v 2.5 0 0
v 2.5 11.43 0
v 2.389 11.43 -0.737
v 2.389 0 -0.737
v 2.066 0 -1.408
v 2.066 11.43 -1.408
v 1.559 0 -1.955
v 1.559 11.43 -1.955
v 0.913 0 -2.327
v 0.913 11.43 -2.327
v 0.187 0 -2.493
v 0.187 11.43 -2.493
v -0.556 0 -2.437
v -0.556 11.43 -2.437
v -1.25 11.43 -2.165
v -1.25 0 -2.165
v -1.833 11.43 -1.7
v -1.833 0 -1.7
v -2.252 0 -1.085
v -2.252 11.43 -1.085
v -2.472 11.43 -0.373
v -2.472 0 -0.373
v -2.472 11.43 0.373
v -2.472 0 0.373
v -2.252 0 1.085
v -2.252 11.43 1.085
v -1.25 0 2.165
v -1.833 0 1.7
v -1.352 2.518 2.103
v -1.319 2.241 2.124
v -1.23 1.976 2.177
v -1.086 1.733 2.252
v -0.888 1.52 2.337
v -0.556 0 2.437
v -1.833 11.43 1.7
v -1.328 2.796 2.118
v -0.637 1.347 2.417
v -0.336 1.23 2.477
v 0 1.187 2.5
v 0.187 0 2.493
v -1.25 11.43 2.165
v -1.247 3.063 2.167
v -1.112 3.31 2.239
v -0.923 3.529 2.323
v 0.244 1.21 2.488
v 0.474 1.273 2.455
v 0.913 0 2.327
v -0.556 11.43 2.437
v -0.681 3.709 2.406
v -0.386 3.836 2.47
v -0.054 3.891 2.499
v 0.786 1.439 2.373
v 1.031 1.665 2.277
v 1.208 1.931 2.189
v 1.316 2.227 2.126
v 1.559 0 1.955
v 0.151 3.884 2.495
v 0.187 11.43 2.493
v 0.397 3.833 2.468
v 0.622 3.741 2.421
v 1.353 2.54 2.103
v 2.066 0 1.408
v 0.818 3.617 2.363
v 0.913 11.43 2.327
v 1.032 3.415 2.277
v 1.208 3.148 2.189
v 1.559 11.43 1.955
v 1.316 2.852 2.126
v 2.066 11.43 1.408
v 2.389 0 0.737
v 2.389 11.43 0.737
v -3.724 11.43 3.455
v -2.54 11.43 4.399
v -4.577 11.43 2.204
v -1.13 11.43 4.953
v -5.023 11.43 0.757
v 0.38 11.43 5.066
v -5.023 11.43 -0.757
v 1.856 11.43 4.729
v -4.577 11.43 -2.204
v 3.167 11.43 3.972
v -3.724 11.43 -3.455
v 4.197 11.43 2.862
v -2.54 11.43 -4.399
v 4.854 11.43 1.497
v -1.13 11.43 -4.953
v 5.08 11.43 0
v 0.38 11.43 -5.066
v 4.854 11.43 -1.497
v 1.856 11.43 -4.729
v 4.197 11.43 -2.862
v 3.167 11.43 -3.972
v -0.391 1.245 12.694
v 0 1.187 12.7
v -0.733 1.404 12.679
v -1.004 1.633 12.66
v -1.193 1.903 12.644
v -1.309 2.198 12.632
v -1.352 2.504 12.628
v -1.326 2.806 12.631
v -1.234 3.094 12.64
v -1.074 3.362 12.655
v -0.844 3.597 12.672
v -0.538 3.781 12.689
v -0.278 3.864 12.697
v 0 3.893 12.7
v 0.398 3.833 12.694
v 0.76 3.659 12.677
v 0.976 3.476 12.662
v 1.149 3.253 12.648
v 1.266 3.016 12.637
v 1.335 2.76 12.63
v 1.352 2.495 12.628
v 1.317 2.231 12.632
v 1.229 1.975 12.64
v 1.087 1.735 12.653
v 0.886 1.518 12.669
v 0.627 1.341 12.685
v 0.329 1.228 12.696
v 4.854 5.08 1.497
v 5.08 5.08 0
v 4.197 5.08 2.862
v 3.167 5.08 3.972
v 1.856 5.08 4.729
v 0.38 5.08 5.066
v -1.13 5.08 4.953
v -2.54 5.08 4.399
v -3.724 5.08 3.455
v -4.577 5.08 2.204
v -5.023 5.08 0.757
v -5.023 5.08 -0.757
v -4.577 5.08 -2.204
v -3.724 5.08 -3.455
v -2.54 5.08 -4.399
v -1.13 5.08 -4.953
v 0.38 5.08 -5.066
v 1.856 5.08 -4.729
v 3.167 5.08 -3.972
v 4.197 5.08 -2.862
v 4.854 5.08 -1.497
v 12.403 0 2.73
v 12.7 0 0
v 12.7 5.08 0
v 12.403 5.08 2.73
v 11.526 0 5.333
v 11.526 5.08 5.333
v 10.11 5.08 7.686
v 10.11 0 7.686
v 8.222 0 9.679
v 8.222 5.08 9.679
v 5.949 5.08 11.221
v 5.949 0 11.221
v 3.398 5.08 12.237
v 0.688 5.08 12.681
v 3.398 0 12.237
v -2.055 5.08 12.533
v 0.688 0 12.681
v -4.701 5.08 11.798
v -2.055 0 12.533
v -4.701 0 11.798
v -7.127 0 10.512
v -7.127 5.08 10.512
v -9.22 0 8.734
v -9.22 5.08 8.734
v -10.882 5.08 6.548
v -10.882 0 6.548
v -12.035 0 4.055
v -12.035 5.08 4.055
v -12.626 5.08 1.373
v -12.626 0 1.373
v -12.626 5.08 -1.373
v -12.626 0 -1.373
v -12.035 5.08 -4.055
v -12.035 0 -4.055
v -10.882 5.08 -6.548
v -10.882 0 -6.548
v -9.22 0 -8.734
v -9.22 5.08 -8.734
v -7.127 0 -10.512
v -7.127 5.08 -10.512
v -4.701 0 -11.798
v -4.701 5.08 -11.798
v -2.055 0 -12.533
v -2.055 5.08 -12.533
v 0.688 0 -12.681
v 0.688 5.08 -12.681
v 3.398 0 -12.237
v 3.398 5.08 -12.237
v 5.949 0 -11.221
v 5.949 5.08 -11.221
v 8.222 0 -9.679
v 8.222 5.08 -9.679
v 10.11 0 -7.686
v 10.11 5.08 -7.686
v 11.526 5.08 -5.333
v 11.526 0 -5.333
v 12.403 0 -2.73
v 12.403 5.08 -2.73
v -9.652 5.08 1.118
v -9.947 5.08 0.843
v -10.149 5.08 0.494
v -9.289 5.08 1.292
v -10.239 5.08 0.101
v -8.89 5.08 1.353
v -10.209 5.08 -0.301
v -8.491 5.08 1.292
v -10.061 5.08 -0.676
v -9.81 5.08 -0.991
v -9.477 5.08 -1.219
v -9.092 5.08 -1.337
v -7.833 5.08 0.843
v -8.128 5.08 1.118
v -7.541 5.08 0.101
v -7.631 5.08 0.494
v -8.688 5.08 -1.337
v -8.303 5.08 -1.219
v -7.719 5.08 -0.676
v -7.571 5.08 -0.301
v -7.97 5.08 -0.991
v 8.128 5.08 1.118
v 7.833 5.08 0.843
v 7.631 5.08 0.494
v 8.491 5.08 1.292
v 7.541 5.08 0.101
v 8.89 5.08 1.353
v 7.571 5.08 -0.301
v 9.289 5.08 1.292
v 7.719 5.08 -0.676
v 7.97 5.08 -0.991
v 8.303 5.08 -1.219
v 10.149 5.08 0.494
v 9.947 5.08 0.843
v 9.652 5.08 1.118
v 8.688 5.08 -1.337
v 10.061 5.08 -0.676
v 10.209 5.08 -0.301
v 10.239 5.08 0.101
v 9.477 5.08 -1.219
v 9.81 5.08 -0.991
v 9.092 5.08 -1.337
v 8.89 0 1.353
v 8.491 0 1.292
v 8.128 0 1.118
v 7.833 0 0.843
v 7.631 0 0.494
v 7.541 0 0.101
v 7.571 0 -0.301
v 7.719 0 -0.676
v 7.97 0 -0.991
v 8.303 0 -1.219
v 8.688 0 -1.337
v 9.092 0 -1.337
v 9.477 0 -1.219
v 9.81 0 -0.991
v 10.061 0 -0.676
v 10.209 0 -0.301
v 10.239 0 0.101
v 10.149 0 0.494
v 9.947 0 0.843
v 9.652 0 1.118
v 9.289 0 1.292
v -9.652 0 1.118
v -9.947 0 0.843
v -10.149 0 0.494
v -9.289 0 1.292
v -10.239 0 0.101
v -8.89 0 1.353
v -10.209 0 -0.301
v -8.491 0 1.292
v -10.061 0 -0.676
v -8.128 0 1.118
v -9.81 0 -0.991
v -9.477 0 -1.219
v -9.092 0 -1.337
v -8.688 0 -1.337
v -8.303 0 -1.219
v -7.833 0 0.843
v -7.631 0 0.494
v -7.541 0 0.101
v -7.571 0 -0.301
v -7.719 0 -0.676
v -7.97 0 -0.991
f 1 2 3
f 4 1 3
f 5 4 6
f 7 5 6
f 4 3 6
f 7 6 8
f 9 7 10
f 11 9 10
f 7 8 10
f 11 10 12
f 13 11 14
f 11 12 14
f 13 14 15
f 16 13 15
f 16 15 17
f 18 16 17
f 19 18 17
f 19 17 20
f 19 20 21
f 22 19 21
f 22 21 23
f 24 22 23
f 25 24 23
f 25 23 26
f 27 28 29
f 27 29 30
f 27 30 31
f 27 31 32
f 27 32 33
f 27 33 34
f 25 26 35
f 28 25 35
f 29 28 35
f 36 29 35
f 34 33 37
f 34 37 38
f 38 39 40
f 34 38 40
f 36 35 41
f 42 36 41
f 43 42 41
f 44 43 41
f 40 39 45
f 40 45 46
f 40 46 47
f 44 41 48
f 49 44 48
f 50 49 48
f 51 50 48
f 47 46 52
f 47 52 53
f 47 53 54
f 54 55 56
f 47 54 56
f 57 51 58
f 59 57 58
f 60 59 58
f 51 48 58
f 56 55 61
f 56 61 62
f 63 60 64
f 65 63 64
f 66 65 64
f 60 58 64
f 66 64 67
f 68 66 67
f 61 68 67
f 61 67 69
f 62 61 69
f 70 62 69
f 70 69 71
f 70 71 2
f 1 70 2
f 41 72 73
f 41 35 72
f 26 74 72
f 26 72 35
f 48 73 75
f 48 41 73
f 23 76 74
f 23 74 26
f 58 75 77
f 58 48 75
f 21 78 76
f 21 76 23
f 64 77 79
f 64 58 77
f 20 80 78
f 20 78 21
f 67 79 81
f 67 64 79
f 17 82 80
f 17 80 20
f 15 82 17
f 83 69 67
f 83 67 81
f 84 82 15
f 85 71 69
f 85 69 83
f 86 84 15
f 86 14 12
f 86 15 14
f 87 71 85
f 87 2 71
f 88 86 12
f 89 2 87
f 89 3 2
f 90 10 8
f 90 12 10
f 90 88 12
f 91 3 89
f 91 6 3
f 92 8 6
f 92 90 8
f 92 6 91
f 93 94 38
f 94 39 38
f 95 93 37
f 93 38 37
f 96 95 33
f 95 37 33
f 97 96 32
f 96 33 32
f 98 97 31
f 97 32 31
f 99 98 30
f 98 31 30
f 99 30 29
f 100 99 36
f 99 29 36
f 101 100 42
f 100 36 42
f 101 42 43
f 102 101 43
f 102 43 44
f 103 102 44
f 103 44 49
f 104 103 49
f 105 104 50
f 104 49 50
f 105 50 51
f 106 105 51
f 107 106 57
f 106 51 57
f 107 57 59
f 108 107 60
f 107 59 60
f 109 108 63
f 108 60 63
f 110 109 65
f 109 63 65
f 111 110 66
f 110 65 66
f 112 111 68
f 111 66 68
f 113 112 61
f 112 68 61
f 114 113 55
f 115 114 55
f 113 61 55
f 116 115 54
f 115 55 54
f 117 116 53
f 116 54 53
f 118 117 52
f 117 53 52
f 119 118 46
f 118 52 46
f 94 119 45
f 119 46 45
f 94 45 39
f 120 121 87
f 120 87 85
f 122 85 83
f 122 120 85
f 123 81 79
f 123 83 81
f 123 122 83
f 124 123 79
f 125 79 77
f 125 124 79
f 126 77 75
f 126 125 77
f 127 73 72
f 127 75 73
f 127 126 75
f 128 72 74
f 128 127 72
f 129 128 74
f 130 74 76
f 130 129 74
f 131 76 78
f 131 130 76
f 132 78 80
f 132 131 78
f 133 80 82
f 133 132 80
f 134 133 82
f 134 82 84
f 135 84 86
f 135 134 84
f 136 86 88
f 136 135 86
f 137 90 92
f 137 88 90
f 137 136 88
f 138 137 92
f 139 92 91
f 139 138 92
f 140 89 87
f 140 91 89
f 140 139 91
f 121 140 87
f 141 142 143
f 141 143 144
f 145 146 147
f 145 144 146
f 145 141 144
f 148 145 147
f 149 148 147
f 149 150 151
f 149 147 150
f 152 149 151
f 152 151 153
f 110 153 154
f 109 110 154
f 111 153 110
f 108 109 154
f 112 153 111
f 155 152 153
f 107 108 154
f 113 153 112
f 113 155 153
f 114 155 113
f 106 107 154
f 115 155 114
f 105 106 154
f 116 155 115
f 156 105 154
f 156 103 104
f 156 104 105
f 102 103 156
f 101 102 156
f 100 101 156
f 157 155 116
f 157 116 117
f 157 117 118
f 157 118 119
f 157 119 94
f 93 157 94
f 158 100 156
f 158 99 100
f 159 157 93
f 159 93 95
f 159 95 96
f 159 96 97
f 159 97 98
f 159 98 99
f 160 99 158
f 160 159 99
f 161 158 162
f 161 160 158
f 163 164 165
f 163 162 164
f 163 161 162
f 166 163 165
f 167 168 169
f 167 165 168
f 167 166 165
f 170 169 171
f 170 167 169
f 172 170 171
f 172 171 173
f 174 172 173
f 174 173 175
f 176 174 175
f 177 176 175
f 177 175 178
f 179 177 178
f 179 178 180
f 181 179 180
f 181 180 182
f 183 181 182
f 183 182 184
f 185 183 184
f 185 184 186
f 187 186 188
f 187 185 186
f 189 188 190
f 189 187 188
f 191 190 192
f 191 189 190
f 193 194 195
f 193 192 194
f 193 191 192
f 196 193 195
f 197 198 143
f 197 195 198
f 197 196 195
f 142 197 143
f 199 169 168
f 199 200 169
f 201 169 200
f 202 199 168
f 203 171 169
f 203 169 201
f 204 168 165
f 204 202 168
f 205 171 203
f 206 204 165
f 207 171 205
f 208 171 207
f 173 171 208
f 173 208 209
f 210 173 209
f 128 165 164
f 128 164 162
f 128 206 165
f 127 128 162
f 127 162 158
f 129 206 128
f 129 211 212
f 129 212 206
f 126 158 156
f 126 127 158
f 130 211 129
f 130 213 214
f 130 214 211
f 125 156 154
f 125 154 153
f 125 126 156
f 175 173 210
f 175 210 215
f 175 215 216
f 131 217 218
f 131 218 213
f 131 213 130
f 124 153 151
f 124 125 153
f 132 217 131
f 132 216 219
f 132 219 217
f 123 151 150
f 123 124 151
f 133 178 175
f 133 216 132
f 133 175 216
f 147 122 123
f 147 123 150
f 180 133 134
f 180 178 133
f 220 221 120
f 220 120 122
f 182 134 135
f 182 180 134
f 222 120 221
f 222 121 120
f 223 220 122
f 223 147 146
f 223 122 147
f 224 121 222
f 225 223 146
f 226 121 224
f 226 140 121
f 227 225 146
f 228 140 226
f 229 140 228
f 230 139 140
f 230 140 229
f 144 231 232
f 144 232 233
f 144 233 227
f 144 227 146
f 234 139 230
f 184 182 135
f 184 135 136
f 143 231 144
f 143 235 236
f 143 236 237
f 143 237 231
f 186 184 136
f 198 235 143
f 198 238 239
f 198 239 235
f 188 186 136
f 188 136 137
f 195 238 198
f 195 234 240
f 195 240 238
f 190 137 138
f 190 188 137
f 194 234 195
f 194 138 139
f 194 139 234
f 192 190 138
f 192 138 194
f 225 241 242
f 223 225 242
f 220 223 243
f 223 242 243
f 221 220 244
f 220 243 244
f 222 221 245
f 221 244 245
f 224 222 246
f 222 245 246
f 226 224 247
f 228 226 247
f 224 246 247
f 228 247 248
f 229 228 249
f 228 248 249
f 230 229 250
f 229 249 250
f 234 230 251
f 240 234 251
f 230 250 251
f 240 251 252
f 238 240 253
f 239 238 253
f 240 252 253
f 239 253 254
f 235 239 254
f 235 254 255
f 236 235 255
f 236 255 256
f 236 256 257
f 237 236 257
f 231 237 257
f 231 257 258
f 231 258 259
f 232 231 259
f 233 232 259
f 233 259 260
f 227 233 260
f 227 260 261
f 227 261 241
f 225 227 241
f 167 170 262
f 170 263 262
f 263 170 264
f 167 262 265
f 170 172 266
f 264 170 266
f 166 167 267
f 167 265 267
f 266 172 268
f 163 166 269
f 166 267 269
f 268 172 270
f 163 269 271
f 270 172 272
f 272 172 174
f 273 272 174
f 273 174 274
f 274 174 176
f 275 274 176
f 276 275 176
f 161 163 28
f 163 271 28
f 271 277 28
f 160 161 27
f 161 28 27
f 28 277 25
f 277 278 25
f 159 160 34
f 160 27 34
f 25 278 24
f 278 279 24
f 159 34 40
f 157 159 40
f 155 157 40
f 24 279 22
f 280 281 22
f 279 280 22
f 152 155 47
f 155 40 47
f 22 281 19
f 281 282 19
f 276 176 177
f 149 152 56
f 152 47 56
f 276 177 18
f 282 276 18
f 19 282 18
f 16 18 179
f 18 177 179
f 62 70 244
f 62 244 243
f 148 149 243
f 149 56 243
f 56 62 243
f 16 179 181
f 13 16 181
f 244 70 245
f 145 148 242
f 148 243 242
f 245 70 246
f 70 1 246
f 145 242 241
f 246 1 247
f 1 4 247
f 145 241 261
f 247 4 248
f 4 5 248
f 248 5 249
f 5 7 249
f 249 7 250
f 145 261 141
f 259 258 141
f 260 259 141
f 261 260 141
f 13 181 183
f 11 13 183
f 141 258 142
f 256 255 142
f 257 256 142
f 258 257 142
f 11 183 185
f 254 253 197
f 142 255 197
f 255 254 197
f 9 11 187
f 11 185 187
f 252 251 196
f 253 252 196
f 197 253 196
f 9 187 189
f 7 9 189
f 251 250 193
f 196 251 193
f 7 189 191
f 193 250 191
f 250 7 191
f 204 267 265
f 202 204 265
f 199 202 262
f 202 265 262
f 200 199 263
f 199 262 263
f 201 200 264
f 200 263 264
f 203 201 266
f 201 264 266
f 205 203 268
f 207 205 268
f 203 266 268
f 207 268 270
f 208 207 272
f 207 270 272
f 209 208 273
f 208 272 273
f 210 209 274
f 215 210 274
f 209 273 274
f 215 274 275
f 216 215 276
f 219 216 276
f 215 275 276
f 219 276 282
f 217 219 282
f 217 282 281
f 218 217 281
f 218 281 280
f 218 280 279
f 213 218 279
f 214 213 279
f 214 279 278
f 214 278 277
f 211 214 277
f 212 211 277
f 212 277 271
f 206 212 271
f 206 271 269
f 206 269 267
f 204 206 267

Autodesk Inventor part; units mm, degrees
ref_plane "YZ Plane" through (0, 0, 0) normal (1, 0, 0) x (0, 1, 0)
ref_plane "XZ Plane" through (0, 0, 0) normal (0, 1, 0) x (-1, 0, 0)
sketch "Sketch1" plane through (0, 0, 0) normal (0, 0, 1) x (1, 0, 0)
  line L0 (2.5, 11.43) -> (5.08, 11.43)
  line L1 (5.08, 11.43) -> (5.08, 5.08)
  line L2 (5.08, 5.08) -> (12.7, 5.08)
  line L3 (12.7, 5.08) -> (12.7, 0)
  line L4 (12.7, 0) -> (2.5, 0)
  line L5 (2.5, 0) -> (2.5, 11.43)
  line L6 (0, -2.286) -> (0, 13.716) projected
  point P0 (0, 0)
  dimension "d0" = 2.5
  dimension "d1" = 12.7
  dimension "d2" = 5.08
  dimension "d3" = 5.08
  dimension "d4" = 6.35
revolve "Revolution1" add sketch "Sketch1" angle 360 about axis through (0, -10, 0) along (0, 1, 0)
sketch "Sketch2" plane through (0, 5.08, 0) normal (0, 1, 0) x (1, 0, 0)
  circle A0 centre (0, 0) radius 12.7 projected
  line L0 (-8.89, 0) -> (8.89, 0) construction
  dimension "d6" = 17.78
hole "Hole1" at (-8.89, 5.08, 0) at (8.89, 5.08, 0) direction (0, -1, 0) diameter 2.7051 end through all
ref_plane "Work Plane1" through (0, 2.54, 12.7) normal (0, 0, 1) x (1, 0, 0)
sketch "Sketch3" plane through (0, 2.54, 12.7) normal (0, 0, 1) x (1, 0, 0)
  point P0 (0, -2.54)
  point P1 (0, 0)
  dimension "d17" = 2.54
  dimension "d18" = 0
hole "Hole2" at (0, 2.54, 12.7) direction (0, 0, -1) diameter 2.7051 end up to surface
properties part number "carousel_hub"
